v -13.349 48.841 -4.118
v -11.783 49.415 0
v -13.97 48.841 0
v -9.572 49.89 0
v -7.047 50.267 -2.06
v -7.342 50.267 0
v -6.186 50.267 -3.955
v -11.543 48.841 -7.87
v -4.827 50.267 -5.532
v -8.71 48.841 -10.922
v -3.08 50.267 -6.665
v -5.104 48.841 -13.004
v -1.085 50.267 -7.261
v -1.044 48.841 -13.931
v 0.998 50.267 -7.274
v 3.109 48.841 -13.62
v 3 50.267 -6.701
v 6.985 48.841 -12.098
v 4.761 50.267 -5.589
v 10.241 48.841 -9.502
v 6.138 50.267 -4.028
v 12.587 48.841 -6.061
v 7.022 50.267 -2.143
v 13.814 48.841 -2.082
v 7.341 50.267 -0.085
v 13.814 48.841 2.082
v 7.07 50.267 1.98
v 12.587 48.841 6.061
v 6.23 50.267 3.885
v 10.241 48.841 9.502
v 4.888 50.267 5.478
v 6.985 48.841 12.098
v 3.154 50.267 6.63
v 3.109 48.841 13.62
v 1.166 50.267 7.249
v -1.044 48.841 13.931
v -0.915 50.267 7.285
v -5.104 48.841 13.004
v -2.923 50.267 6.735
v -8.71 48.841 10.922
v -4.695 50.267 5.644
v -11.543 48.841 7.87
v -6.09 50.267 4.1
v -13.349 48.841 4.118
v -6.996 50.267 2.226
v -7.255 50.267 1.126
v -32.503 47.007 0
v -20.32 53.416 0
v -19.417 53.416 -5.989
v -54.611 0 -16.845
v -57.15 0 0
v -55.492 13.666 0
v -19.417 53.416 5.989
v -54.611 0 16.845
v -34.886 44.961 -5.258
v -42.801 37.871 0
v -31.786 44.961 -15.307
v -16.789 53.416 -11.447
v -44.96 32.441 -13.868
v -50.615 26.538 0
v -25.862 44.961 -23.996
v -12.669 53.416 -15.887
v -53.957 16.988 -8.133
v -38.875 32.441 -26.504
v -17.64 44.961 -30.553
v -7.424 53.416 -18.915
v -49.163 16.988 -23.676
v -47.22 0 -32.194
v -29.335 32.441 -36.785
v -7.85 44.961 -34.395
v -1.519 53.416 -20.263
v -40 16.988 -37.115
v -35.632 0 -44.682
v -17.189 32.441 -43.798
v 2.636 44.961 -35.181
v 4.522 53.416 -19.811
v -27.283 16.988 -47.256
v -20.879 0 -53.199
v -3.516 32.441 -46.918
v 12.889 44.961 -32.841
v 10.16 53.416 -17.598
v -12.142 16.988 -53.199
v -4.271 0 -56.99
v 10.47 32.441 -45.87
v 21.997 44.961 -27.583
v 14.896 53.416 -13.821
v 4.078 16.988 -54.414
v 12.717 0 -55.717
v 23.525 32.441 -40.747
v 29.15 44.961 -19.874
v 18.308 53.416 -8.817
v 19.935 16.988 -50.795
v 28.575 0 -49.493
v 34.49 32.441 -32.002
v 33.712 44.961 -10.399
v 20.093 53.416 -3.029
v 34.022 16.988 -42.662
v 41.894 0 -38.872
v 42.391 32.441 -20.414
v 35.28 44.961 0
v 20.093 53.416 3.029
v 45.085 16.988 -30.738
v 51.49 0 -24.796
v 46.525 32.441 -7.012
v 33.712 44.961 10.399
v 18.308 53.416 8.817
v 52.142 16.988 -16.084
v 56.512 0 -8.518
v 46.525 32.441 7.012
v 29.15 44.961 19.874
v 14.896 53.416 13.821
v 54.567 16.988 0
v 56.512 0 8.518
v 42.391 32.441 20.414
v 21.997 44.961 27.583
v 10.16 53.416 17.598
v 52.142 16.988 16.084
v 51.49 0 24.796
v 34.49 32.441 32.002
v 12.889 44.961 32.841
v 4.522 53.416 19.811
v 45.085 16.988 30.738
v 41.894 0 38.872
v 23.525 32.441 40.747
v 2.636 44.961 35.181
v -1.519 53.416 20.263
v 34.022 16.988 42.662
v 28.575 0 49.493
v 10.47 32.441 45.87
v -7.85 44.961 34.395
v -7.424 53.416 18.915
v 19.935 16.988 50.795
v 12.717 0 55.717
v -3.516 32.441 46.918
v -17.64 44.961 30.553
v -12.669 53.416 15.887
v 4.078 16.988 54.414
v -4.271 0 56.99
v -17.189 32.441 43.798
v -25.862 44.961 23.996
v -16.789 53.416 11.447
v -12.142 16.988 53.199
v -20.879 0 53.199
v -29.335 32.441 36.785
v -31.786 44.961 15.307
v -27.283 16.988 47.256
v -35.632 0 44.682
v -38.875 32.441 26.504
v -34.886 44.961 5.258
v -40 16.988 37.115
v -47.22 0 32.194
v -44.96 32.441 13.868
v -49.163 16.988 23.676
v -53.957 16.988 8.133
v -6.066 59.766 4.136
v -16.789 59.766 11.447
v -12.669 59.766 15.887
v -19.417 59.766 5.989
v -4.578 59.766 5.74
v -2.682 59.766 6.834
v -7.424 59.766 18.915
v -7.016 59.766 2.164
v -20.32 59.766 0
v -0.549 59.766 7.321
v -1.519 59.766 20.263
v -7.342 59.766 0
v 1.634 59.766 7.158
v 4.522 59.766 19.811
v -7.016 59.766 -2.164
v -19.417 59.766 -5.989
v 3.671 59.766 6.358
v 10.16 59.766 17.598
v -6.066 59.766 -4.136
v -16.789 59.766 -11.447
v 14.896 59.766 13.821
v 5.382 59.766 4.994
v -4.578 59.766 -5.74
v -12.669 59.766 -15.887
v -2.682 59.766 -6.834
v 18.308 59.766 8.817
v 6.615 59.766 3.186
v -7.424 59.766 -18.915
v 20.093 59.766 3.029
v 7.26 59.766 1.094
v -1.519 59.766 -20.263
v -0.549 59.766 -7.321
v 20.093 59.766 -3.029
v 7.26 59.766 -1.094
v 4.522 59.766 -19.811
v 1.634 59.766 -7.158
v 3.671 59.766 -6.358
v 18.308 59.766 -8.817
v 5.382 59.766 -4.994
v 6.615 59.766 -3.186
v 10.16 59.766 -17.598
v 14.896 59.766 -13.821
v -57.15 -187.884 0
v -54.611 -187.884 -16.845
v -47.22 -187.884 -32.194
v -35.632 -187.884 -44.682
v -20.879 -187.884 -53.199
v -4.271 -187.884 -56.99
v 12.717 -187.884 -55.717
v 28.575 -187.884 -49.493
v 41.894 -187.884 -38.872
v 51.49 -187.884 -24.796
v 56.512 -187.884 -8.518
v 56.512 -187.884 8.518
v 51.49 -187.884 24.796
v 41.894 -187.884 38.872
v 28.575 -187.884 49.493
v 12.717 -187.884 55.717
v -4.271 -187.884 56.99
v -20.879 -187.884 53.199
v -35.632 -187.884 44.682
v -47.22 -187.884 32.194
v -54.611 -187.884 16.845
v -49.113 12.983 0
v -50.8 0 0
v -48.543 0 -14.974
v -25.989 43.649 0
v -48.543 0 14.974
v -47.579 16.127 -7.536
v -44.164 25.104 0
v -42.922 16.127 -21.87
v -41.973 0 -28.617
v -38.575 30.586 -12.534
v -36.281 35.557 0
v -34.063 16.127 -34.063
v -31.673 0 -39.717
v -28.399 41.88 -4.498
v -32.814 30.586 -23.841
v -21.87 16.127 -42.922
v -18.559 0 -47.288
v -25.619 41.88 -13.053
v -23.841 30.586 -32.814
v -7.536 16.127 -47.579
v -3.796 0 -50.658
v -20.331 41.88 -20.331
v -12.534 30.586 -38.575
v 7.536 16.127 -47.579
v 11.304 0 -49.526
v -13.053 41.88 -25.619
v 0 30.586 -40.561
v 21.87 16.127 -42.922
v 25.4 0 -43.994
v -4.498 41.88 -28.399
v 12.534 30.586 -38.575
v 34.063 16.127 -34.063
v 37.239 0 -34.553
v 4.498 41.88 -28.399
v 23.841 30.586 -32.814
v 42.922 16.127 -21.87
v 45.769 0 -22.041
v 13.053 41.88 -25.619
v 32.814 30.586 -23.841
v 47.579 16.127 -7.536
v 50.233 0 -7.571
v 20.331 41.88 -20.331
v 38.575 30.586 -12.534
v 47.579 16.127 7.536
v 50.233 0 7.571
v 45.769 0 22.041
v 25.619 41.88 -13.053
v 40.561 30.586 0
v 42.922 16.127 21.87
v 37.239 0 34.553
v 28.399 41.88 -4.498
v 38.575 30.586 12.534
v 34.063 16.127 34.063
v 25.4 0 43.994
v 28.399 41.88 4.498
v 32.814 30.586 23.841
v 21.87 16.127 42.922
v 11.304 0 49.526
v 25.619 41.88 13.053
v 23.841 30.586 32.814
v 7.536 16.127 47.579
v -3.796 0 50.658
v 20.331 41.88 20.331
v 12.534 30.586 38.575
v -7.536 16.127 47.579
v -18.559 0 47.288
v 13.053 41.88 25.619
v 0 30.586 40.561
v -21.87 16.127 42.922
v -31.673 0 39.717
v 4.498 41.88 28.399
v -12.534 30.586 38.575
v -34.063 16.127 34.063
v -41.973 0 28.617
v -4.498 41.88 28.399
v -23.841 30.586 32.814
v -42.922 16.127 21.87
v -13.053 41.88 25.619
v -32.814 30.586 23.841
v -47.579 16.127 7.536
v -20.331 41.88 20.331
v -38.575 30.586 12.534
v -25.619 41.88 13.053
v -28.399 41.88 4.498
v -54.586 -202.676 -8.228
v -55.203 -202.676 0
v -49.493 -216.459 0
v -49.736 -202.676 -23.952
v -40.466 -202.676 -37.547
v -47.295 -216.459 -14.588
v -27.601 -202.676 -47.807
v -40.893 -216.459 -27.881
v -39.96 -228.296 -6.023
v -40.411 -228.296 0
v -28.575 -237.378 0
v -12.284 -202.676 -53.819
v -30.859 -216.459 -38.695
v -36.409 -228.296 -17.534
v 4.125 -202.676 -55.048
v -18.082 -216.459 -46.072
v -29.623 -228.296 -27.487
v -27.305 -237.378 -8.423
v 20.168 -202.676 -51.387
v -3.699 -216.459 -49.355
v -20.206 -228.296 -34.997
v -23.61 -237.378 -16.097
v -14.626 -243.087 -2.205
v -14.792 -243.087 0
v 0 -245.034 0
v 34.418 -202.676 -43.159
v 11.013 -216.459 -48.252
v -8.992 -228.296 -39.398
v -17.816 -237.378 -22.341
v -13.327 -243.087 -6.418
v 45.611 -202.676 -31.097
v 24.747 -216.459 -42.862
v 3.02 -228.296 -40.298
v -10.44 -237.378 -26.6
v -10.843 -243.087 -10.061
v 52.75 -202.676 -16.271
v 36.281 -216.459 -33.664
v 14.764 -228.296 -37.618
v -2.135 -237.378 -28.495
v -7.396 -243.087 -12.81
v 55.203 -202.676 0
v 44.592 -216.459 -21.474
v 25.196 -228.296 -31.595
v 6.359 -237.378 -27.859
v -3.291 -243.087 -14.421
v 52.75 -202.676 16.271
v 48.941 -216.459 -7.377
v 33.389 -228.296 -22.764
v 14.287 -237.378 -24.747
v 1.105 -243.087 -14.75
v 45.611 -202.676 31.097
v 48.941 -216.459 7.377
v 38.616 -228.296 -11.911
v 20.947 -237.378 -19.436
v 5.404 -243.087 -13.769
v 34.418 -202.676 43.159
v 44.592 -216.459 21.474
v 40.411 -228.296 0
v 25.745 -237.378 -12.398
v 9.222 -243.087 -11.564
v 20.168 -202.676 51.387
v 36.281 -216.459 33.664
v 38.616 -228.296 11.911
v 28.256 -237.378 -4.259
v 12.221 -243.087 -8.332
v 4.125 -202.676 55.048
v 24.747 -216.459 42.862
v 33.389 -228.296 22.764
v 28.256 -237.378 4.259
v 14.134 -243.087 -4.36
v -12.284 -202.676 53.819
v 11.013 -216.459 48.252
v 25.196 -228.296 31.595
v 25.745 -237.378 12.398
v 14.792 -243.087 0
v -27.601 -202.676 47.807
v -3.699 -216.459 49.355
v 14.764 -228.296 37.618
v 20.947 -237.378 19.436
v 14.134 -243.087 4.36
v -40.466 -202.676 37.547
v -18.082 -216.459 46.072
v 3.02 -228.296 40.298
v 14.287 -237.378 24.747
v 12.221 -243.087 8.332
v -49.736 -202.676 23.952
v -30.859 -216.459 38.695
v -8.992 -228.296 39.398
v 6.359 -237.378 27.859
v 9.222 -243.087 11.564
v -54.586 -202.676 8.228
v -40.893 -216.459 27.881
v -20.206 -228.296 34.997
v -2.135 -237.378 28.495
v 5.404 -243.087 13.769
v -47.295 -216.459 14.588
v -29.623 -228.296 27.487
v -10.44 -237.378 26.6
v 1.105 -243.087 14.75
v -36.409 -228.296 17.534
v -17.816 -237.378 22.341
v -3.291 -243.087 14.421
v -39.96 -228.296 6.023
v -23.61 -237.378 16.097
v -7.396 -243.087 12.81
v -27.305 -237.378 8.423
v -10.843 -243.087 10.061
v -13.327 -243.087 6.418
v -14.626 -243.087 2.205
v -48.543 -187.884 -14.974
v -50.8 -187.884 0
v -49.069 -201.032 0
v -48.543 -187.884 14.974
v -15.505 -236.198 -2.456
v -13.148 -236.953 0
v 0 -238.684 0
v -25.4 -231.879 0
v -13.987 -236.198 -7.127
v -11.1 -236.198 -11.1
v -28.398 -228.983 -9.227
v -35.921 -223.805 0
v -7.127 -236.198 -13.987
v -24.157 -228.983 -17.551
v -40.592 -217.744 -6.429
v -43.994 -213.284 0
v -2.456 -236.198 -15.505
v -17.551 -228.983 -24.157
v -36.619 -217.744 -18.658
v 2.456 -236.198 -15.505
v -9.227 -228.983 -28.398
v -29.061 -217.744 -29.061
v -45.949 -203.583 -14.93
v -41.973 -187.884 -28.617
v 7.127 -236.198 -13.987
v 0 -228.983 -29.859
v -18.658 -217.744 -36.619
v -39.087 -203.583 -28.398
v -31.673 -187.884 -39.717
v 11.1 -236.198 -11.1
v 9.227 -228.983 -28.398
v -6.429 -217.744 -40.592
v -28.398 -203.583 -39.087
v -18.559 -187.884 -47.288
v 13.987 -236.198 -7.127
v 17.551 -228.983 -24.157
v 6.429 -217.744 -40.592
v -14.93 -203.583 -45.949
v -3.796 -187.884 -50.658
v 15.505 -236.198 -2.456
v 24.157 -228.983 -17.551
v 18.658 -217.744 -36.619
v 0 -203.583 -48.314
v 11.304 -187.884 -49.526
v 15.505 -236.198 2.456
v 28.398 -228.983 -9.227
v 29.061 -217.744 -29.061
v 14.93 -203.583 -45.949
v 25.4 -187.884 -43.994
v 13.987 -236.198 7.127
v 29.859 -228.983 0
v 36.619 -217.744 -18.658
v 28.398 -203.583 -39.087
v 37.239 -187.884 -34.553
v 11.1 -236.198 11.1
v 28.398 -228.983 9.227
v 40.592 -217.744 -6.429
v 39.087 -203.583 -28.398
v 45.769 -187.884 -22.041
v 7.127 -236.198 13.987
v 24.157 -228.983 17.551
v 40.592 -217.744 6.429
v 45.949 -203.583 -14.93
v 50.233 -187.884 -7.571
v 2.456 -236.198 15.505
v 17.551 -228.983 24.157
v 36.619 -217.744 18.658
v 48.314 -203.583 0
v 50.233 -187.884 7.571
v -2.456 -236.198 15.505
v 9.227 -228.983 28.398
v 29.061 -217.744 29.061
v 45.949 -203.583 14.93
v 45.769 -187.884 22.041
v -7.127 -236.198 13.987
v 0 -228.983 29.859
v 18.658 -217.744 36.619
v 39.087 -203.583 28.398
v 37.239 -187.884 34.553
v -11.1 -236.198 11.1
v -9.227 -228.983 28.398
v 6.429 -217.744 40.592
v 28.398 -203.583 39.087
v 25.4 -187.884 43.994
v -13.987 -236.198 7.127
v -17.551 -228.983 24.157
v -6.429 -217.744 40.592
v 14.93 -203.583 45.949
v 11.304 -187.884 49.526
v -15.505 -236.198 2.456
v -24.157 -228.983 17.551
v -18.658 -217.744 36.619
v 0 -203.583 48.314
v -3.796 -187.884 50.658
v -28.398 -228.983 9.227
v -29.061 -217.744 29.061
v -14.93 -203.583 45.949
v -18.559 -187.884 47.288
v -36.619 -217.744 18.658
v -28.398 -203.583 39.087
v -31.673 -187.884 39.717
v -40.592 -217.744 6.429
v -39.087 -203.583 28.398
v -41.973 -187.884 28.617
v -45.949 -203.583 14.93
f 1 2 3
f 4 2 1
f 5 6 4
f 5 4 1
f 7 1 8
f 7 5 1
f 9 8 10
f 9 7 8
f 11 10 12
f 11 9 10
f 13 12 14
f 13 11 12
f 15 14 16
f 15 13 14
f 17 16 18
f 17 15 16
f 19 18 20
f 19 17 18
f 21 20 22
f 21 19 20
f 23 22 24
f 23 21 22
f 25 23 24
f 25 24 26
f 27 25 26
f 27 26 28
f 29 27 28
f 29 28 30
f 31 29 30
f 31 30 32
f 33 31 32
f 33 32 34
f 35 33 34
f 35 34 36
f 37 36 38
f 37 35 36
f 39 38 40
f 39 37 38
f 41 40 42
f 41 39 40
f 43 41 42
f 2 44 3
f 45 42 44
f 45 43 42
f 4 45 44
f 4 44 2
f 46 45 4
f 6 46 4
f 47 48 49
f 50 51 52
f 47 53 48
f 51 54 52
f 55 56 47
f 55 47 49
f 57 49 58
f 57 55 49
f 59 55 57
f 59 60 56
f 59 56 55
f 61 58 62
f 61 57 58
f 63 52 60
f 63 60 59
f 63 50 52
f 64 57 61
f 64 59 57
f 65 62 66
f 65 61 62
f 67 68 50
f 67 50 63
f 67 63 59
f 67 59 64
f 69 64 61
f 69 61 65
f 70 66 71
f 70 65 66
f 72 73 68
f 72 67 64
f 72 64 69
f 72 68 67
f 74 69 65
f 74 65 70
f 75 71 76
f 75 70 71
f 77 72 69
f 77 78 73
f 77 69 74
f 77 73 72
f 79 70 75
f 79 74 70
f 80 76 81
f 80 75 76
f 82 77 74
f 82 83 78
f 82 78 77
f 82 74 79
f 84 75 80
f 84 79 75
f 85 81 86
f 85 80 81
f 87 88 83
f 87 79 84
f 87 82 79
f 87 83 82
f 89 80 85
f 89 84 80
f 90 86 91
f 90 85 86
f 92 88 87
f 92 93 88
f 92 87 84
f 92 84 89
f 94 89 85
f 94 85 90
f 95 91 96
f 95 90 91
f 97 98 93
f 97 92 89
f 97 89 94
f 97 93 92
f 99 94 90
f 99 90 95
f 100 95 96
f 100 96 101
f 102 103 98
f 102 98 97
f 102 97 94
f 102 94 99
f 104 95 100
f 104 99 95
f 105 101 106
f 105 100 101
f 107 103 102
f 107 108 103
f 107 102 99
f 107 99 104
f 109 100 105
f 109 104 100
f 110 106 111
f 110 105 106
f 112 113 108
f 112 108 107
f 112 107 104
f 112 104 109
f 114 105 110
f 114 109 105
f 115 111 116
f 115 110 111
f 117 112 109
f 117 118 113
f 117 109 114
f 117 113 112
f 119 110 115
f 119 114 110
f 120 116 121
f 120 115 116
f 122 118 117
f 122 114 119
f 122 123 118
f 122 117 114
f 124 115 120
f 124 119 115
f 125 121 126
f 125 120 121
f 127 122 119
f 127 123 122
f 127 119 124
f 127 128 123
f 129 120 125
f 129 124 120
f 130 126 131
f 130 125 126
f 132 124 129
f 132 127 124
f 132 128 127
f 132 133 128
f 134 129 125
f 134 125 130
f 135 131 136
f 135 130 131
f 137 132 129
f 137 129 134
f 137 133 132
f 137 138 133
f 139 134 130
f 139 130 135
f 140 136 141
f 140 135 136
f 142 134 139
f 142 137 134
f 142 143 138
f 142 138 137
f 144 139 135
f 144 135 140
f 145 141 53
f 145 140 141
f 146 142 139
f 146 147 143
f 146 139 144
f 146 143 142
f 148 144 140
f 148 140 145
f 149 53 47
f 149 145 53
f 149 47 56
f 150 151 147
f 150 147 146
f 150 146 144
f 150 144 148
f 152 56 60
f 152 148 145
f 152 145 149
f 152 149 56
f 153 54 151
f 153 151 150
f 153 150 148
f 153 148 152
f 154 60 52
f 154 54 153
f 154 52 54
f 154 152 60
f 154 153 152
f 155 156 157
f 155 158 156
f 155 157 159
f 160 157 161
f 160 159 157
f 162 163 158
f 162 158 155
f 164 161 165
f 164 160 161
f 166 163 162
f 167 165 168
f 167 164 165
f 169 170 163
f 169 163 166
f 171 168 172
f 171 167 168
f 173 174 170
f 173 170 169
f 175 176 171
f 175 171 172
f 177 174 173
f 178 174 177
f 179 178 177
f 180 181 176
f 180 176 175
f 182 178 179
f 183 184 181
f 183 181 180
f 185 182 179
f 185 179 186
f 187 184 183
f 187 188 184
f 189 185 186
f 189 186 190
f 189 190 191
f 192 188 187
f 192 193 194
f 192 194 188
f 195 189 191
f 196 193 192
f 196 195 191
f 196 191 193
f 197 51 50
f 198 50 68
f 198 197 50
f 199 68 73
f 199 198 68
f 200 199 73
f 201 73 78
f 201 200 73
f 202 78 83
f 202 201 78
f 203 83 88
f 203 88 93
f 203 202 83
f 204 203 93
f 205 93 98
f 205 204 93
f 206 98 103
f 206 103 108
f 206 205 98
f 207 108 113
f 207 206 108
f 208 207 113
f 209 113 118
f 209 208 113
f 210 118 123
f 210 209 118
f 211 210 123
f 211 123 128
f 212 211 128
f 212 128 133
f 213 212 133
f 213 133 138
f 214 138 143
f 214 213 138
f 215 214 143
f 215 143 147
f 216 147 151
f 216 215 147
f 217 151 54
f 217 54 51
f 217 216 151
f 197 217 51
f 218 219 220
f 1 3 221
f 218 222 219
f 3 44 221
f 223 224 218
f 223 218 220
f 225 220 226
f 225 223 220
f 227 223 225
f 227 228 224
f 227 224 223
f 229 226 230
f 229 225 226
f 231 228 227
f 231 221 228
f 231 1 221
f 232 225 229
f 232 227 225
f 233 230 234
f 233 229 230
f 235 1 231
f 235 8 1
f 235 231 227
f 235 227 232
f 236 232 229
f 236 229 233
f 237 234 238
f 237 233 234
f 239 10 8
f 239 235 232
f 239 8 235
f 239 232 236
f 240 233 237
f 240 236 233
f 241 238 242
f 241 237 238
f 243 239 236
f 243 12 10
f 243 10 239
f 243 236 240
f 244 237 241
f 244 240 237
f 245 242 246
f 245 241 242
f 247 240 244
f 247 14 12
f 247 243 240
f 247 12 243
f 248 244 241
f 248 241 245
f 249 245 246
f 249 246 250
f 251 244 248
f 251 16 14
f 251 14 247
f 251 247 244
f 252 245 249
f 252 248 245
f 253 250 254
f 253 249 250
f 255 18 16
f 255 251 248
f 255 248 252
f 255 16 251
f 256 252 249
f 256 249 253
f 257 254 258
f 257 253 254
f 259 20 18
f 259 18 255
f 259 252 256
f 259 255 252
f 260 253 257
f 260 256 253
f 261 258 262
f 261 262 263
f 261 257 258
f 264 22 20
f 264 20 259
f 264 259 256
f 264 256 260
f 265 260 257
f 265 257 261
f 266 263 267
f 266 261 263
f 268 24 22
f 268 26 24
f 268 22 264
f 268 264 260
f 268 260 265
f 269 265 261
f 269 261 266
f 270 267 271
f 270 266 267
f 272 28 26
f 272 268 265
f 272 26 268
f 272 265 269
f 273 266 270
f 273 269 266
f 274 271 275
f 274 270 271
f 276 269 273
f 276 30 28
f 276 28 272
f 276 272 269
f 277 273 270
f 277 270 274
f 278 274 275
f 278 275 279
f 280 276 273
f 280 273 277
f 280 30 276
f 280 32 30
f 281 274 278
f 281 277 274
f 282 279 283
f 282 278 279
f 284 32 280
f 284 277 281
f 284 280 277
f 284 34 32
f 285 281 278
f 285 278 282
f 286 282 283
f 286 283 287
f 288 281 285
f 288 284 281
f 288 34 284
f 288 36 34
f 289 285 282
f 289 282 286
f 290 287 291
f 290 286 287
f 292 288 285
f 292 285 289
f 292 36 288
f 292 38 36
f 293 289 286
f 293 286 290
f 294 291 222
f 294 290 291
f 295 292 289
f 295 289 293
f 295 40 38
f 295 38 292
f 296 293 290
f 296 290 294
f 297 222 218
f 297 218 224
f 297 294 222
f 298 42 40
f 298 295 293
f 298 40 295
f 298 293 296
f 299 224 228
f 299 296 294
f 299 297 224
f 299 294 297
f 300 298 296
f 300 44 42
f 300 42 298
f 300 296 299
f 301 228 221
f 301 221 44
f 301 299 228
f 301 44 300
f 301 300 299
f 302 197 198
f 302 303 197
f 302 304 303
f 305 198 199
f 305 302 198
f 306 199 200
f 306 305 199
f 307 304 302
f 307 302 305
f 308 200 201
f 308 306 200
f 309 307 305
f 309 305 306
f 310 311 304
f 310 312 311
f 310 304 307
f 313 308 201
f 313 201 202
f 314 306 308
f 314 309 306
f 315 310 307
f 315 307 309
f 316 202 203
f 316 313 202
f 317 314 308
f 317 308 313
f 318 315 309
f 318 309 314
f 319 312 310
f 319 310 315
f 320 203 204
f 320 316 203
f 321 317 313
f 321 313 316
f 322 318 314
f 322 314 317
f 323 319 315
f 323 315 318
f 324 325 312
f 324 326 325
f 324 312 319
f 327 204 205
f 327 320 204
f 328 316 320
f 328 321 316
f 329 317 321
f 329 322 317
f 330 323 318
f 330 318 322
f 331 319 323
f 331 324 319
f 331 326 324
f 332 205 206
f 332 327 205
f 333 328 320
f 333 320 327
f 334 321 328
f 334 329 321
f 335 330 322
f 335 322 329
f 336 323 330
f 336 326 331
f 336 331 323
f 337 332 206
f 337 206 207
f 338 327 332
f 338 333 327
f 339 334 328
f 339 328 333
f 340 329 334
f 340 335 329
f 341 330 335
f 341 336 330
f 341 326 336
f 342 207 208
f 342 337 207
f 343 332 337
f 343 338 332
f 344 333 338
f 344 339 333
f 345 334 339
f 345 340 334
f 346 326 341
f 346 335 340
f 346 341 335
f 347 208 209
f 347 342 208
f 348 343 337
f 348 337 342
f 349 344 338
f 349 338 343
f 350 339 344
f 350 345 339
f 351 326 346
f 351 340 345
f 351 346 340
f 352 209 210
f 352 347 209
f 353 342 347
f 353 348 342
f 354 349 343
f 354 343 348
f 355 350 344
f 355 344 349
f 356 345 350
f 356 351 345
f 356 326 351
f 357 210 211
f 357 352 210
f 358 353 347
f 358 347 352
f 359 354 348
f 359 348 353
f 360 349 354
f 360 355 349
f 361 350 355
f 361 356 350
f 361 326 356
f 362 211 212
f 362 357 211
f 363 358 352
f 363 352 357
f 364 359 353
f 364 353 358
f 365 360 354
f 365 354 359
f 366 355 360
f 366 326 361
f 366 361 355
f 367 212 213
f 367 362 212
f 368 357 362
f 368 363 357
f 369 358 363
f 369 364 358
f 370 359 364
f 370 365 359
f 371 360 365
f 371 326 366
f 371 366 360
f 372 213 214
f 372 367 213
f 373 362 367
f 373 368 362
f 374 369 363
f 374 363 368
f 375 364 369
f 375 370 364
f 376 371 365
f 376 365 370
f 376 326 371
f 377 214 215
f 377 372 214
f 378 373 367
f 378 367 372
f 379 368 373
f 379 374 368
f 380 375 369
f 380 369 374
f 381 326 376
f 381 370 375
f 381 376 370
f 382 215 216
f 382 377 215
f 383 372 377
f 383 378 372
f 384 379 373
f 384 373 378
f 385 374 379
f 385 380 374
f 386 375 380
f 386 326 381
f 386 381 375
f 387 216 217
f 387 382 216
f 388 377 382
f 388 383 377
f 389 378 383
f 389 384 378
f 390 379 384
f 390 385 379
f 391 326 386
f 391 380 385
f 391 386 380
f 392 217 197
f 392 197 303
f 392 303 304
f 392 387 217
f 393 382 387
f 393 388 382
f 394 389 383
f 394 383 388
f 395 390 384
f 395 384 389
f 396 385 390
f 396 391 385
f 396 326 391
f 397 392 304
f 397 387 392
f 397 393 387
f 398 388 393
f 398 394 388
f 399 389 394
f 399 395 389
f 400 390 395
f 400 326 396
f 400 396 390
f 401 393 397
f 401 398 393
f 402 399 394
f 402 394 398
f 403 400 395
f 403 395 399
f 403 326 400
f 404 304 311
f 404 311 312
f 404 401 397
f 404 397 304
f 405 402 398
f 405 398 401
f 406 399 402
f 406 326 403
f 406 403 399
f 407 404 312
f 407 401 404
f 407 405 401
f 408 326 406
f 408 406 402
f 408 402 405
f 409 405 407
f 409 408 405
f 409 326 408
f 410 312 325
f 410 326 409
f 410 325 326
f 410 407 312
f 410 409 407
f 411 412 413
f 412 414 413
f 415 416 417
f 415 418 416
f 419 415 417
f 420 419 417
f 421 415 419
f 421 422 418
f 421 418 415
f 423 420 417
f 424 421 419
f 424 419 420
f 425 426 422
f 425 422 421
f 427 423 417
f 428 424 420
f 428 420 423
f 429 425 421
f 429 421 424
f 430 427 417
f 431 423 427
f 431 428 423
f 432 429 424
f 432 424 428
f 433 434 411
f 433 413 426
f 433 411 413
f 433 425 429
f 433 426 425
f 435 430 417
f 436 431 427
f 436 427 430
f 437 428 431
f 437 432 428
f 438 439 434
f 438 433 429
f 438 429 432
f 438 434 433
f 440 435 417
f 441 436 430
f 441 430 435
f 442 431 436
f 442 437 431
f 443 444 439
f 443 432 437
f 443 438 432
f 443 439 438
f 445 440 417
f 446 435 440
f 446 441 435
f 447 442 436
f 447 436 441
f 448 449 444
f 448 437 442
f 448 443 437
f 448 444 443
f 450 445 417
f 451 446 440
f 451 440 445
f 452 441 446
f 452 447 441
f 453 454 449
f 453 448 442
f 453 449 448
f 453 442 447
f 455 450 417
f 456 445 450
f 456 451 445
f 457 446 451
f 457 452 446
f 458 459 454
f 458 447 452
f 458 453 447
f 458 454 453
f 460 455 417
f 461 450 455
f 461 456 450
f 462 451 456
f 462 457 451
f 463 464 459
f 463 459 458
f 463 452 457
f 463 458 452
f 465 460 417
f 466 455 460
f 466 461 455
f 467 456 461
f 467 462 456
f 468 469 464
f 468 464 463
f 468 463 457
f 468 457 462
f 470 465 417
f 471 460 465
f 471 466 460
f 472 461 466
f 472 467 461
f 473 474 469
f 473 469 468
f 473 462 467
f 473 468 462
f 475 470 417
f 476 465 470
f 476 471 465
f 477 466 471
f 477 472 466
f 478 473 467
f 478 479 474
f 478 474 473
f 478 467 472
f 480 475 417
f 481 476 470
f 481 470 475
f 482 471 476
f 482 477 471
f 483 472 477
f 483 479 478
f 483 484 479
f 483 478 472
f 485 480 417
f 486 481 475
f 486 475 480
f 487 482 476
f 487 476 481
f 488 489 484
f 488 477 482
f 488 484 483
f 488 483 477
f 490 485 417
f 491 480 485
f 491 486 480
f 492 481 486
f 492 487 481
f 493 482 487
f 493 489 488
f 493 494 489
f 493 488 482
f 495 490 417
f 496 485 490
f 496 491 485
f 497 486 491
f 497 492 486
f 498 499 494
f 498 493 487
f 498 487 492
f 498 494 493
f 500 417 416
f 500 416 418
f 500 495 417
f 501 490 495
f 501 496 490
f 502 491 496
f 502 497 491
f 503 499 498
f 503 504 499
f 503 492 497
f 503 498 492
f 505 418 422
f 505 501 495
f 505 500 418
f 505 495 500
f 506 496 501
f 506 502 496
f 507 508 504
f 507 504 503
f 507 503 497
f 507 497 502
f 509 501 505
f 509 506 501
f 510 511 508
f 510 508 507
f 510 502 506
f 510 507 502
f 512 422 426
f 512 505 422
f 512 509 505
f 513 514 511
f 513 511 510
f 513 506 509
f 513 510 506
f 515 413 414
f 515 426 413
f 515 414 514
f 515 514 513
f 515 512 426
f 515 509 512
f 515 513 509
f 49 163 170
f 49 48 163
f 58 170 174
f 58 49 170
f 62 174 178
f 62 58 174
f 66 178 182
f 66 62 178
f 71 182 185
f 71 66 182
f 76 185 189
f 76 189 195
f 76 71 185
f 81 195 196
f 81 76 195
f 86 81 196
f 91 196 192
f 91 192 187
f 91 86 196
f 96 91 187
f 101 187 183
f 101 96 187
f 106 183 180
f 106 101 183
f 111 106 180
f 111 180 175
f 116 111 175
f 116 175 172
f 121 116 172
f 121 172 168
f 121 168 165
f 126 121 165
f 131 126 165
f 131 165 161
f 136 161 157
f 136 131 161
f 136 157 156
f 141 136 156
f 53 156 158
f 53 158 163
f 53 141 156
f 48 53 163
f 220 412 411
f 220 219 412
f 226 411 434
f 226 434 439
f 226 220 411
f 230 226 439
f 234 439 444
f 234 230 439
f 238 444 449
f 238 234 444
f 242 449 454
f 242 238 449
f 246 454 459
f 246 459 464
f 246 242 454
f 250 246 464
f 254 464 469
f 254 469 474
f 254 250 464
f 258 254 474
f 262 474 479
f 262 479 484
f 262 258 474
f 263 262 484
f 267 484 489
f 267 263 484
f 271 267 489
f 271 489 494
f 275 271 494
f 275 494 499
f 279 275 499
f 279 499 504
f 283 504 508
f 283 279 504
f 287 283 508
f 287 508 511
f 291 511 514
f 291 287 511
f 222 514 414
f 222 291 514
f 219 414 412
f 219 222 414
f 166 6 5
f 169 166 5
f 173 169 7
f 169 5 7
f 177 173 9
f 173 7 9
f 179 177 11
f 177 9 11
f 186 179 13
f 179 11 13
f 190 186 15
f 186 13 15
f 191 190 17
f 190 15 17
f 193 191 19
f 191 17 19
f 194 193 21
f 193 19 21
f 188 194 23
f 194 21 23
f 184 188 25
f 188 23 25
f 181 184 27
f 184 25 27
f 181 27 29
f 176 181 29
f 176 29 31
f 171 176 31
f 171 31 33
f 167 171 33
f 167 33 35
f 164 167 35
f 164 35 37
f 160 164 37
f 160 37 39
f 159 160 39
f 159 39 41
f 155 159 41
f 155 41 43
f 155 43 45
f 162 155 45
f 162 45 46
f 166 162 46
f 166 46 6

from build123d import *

# Parameters (mm, degrees)
F_5_8_18_TAPPED_HOLE2_D     = 14.68374
F_5_8_18_TAPPED_HOLE2_DEPTH = 38.862
F_5_8_18_TAPPED_HOLE2_TIP   = 4.411440553


with BuildPart() as part:
    # Sketch4 → Revolve1 (revolve)
    with BuildSketch(Plane.XY):
        with BuildLine():
            Line((20.32, 59.765541746), (20.32, 53.415541746))
            ThreePointArc((20.32, 53.415541746), (47.050029224, 32.440981027), (57.15, 0))
            Line((57.15, 0), (57.15, -187.884458254))
            ThreePointArc((57.15, -187.884458254), (40.411152545, -228.295610799), (0, -245.034458254))
            Line((0, -245.034458254), (0, -238.684458254))
            ThreePointArc((0, -238.684458254), (35.921024484, -223.805482738), (50.8, -187.884458254))
            Line((50.8, -187.884458254), (50.8, 0))
            ThreePointArc((50.8, 0), (40.560547334, 30.58565023), (13.97, 48.841366688))
            ThreePointArc((13.97, 48.841366688), (8.309203928, 50.115837118), (2.54, 50.736460263))
            Line((2.54, 50.736460263), (2.54, 59.765541746))
            Line((2.54, 59.765541746), (13.97, 59.765541746))
            Line((13.97, 59.765541746), (20.32, 59.765541746))
        make_face()
    revolve(axis=Axis((0, 80.447885323, 0), (0, -1, 0)))

    # 5/8-18 Tapped Hole2
    with Locations(Plane(origin=(0, 59.765541746, 0), x_dir=(1, 0, 0), z_dir=(0, 1, 0))):
        with Locations((0, 0)):
            Hole(F_5_8_18_TAPPED_HOLE2_D / 2, depth=F_5_8_18_TAPPED_HOLE2_DEPTH)
            with Locations((0, 0, -(F_5_8_18_TAPPED_HOLE2_DEPTH + F_5_8_18_TAPPED_HOLE2_TIP / 2))):  # 118° drill point
                Cone(0, F_5_8_18_TAPPED_HOLE2_D / 2, F_5_8_18_TAPPED_HOLE2_TIP, mode=Mode.SUBTRACT)


solid = part.part
